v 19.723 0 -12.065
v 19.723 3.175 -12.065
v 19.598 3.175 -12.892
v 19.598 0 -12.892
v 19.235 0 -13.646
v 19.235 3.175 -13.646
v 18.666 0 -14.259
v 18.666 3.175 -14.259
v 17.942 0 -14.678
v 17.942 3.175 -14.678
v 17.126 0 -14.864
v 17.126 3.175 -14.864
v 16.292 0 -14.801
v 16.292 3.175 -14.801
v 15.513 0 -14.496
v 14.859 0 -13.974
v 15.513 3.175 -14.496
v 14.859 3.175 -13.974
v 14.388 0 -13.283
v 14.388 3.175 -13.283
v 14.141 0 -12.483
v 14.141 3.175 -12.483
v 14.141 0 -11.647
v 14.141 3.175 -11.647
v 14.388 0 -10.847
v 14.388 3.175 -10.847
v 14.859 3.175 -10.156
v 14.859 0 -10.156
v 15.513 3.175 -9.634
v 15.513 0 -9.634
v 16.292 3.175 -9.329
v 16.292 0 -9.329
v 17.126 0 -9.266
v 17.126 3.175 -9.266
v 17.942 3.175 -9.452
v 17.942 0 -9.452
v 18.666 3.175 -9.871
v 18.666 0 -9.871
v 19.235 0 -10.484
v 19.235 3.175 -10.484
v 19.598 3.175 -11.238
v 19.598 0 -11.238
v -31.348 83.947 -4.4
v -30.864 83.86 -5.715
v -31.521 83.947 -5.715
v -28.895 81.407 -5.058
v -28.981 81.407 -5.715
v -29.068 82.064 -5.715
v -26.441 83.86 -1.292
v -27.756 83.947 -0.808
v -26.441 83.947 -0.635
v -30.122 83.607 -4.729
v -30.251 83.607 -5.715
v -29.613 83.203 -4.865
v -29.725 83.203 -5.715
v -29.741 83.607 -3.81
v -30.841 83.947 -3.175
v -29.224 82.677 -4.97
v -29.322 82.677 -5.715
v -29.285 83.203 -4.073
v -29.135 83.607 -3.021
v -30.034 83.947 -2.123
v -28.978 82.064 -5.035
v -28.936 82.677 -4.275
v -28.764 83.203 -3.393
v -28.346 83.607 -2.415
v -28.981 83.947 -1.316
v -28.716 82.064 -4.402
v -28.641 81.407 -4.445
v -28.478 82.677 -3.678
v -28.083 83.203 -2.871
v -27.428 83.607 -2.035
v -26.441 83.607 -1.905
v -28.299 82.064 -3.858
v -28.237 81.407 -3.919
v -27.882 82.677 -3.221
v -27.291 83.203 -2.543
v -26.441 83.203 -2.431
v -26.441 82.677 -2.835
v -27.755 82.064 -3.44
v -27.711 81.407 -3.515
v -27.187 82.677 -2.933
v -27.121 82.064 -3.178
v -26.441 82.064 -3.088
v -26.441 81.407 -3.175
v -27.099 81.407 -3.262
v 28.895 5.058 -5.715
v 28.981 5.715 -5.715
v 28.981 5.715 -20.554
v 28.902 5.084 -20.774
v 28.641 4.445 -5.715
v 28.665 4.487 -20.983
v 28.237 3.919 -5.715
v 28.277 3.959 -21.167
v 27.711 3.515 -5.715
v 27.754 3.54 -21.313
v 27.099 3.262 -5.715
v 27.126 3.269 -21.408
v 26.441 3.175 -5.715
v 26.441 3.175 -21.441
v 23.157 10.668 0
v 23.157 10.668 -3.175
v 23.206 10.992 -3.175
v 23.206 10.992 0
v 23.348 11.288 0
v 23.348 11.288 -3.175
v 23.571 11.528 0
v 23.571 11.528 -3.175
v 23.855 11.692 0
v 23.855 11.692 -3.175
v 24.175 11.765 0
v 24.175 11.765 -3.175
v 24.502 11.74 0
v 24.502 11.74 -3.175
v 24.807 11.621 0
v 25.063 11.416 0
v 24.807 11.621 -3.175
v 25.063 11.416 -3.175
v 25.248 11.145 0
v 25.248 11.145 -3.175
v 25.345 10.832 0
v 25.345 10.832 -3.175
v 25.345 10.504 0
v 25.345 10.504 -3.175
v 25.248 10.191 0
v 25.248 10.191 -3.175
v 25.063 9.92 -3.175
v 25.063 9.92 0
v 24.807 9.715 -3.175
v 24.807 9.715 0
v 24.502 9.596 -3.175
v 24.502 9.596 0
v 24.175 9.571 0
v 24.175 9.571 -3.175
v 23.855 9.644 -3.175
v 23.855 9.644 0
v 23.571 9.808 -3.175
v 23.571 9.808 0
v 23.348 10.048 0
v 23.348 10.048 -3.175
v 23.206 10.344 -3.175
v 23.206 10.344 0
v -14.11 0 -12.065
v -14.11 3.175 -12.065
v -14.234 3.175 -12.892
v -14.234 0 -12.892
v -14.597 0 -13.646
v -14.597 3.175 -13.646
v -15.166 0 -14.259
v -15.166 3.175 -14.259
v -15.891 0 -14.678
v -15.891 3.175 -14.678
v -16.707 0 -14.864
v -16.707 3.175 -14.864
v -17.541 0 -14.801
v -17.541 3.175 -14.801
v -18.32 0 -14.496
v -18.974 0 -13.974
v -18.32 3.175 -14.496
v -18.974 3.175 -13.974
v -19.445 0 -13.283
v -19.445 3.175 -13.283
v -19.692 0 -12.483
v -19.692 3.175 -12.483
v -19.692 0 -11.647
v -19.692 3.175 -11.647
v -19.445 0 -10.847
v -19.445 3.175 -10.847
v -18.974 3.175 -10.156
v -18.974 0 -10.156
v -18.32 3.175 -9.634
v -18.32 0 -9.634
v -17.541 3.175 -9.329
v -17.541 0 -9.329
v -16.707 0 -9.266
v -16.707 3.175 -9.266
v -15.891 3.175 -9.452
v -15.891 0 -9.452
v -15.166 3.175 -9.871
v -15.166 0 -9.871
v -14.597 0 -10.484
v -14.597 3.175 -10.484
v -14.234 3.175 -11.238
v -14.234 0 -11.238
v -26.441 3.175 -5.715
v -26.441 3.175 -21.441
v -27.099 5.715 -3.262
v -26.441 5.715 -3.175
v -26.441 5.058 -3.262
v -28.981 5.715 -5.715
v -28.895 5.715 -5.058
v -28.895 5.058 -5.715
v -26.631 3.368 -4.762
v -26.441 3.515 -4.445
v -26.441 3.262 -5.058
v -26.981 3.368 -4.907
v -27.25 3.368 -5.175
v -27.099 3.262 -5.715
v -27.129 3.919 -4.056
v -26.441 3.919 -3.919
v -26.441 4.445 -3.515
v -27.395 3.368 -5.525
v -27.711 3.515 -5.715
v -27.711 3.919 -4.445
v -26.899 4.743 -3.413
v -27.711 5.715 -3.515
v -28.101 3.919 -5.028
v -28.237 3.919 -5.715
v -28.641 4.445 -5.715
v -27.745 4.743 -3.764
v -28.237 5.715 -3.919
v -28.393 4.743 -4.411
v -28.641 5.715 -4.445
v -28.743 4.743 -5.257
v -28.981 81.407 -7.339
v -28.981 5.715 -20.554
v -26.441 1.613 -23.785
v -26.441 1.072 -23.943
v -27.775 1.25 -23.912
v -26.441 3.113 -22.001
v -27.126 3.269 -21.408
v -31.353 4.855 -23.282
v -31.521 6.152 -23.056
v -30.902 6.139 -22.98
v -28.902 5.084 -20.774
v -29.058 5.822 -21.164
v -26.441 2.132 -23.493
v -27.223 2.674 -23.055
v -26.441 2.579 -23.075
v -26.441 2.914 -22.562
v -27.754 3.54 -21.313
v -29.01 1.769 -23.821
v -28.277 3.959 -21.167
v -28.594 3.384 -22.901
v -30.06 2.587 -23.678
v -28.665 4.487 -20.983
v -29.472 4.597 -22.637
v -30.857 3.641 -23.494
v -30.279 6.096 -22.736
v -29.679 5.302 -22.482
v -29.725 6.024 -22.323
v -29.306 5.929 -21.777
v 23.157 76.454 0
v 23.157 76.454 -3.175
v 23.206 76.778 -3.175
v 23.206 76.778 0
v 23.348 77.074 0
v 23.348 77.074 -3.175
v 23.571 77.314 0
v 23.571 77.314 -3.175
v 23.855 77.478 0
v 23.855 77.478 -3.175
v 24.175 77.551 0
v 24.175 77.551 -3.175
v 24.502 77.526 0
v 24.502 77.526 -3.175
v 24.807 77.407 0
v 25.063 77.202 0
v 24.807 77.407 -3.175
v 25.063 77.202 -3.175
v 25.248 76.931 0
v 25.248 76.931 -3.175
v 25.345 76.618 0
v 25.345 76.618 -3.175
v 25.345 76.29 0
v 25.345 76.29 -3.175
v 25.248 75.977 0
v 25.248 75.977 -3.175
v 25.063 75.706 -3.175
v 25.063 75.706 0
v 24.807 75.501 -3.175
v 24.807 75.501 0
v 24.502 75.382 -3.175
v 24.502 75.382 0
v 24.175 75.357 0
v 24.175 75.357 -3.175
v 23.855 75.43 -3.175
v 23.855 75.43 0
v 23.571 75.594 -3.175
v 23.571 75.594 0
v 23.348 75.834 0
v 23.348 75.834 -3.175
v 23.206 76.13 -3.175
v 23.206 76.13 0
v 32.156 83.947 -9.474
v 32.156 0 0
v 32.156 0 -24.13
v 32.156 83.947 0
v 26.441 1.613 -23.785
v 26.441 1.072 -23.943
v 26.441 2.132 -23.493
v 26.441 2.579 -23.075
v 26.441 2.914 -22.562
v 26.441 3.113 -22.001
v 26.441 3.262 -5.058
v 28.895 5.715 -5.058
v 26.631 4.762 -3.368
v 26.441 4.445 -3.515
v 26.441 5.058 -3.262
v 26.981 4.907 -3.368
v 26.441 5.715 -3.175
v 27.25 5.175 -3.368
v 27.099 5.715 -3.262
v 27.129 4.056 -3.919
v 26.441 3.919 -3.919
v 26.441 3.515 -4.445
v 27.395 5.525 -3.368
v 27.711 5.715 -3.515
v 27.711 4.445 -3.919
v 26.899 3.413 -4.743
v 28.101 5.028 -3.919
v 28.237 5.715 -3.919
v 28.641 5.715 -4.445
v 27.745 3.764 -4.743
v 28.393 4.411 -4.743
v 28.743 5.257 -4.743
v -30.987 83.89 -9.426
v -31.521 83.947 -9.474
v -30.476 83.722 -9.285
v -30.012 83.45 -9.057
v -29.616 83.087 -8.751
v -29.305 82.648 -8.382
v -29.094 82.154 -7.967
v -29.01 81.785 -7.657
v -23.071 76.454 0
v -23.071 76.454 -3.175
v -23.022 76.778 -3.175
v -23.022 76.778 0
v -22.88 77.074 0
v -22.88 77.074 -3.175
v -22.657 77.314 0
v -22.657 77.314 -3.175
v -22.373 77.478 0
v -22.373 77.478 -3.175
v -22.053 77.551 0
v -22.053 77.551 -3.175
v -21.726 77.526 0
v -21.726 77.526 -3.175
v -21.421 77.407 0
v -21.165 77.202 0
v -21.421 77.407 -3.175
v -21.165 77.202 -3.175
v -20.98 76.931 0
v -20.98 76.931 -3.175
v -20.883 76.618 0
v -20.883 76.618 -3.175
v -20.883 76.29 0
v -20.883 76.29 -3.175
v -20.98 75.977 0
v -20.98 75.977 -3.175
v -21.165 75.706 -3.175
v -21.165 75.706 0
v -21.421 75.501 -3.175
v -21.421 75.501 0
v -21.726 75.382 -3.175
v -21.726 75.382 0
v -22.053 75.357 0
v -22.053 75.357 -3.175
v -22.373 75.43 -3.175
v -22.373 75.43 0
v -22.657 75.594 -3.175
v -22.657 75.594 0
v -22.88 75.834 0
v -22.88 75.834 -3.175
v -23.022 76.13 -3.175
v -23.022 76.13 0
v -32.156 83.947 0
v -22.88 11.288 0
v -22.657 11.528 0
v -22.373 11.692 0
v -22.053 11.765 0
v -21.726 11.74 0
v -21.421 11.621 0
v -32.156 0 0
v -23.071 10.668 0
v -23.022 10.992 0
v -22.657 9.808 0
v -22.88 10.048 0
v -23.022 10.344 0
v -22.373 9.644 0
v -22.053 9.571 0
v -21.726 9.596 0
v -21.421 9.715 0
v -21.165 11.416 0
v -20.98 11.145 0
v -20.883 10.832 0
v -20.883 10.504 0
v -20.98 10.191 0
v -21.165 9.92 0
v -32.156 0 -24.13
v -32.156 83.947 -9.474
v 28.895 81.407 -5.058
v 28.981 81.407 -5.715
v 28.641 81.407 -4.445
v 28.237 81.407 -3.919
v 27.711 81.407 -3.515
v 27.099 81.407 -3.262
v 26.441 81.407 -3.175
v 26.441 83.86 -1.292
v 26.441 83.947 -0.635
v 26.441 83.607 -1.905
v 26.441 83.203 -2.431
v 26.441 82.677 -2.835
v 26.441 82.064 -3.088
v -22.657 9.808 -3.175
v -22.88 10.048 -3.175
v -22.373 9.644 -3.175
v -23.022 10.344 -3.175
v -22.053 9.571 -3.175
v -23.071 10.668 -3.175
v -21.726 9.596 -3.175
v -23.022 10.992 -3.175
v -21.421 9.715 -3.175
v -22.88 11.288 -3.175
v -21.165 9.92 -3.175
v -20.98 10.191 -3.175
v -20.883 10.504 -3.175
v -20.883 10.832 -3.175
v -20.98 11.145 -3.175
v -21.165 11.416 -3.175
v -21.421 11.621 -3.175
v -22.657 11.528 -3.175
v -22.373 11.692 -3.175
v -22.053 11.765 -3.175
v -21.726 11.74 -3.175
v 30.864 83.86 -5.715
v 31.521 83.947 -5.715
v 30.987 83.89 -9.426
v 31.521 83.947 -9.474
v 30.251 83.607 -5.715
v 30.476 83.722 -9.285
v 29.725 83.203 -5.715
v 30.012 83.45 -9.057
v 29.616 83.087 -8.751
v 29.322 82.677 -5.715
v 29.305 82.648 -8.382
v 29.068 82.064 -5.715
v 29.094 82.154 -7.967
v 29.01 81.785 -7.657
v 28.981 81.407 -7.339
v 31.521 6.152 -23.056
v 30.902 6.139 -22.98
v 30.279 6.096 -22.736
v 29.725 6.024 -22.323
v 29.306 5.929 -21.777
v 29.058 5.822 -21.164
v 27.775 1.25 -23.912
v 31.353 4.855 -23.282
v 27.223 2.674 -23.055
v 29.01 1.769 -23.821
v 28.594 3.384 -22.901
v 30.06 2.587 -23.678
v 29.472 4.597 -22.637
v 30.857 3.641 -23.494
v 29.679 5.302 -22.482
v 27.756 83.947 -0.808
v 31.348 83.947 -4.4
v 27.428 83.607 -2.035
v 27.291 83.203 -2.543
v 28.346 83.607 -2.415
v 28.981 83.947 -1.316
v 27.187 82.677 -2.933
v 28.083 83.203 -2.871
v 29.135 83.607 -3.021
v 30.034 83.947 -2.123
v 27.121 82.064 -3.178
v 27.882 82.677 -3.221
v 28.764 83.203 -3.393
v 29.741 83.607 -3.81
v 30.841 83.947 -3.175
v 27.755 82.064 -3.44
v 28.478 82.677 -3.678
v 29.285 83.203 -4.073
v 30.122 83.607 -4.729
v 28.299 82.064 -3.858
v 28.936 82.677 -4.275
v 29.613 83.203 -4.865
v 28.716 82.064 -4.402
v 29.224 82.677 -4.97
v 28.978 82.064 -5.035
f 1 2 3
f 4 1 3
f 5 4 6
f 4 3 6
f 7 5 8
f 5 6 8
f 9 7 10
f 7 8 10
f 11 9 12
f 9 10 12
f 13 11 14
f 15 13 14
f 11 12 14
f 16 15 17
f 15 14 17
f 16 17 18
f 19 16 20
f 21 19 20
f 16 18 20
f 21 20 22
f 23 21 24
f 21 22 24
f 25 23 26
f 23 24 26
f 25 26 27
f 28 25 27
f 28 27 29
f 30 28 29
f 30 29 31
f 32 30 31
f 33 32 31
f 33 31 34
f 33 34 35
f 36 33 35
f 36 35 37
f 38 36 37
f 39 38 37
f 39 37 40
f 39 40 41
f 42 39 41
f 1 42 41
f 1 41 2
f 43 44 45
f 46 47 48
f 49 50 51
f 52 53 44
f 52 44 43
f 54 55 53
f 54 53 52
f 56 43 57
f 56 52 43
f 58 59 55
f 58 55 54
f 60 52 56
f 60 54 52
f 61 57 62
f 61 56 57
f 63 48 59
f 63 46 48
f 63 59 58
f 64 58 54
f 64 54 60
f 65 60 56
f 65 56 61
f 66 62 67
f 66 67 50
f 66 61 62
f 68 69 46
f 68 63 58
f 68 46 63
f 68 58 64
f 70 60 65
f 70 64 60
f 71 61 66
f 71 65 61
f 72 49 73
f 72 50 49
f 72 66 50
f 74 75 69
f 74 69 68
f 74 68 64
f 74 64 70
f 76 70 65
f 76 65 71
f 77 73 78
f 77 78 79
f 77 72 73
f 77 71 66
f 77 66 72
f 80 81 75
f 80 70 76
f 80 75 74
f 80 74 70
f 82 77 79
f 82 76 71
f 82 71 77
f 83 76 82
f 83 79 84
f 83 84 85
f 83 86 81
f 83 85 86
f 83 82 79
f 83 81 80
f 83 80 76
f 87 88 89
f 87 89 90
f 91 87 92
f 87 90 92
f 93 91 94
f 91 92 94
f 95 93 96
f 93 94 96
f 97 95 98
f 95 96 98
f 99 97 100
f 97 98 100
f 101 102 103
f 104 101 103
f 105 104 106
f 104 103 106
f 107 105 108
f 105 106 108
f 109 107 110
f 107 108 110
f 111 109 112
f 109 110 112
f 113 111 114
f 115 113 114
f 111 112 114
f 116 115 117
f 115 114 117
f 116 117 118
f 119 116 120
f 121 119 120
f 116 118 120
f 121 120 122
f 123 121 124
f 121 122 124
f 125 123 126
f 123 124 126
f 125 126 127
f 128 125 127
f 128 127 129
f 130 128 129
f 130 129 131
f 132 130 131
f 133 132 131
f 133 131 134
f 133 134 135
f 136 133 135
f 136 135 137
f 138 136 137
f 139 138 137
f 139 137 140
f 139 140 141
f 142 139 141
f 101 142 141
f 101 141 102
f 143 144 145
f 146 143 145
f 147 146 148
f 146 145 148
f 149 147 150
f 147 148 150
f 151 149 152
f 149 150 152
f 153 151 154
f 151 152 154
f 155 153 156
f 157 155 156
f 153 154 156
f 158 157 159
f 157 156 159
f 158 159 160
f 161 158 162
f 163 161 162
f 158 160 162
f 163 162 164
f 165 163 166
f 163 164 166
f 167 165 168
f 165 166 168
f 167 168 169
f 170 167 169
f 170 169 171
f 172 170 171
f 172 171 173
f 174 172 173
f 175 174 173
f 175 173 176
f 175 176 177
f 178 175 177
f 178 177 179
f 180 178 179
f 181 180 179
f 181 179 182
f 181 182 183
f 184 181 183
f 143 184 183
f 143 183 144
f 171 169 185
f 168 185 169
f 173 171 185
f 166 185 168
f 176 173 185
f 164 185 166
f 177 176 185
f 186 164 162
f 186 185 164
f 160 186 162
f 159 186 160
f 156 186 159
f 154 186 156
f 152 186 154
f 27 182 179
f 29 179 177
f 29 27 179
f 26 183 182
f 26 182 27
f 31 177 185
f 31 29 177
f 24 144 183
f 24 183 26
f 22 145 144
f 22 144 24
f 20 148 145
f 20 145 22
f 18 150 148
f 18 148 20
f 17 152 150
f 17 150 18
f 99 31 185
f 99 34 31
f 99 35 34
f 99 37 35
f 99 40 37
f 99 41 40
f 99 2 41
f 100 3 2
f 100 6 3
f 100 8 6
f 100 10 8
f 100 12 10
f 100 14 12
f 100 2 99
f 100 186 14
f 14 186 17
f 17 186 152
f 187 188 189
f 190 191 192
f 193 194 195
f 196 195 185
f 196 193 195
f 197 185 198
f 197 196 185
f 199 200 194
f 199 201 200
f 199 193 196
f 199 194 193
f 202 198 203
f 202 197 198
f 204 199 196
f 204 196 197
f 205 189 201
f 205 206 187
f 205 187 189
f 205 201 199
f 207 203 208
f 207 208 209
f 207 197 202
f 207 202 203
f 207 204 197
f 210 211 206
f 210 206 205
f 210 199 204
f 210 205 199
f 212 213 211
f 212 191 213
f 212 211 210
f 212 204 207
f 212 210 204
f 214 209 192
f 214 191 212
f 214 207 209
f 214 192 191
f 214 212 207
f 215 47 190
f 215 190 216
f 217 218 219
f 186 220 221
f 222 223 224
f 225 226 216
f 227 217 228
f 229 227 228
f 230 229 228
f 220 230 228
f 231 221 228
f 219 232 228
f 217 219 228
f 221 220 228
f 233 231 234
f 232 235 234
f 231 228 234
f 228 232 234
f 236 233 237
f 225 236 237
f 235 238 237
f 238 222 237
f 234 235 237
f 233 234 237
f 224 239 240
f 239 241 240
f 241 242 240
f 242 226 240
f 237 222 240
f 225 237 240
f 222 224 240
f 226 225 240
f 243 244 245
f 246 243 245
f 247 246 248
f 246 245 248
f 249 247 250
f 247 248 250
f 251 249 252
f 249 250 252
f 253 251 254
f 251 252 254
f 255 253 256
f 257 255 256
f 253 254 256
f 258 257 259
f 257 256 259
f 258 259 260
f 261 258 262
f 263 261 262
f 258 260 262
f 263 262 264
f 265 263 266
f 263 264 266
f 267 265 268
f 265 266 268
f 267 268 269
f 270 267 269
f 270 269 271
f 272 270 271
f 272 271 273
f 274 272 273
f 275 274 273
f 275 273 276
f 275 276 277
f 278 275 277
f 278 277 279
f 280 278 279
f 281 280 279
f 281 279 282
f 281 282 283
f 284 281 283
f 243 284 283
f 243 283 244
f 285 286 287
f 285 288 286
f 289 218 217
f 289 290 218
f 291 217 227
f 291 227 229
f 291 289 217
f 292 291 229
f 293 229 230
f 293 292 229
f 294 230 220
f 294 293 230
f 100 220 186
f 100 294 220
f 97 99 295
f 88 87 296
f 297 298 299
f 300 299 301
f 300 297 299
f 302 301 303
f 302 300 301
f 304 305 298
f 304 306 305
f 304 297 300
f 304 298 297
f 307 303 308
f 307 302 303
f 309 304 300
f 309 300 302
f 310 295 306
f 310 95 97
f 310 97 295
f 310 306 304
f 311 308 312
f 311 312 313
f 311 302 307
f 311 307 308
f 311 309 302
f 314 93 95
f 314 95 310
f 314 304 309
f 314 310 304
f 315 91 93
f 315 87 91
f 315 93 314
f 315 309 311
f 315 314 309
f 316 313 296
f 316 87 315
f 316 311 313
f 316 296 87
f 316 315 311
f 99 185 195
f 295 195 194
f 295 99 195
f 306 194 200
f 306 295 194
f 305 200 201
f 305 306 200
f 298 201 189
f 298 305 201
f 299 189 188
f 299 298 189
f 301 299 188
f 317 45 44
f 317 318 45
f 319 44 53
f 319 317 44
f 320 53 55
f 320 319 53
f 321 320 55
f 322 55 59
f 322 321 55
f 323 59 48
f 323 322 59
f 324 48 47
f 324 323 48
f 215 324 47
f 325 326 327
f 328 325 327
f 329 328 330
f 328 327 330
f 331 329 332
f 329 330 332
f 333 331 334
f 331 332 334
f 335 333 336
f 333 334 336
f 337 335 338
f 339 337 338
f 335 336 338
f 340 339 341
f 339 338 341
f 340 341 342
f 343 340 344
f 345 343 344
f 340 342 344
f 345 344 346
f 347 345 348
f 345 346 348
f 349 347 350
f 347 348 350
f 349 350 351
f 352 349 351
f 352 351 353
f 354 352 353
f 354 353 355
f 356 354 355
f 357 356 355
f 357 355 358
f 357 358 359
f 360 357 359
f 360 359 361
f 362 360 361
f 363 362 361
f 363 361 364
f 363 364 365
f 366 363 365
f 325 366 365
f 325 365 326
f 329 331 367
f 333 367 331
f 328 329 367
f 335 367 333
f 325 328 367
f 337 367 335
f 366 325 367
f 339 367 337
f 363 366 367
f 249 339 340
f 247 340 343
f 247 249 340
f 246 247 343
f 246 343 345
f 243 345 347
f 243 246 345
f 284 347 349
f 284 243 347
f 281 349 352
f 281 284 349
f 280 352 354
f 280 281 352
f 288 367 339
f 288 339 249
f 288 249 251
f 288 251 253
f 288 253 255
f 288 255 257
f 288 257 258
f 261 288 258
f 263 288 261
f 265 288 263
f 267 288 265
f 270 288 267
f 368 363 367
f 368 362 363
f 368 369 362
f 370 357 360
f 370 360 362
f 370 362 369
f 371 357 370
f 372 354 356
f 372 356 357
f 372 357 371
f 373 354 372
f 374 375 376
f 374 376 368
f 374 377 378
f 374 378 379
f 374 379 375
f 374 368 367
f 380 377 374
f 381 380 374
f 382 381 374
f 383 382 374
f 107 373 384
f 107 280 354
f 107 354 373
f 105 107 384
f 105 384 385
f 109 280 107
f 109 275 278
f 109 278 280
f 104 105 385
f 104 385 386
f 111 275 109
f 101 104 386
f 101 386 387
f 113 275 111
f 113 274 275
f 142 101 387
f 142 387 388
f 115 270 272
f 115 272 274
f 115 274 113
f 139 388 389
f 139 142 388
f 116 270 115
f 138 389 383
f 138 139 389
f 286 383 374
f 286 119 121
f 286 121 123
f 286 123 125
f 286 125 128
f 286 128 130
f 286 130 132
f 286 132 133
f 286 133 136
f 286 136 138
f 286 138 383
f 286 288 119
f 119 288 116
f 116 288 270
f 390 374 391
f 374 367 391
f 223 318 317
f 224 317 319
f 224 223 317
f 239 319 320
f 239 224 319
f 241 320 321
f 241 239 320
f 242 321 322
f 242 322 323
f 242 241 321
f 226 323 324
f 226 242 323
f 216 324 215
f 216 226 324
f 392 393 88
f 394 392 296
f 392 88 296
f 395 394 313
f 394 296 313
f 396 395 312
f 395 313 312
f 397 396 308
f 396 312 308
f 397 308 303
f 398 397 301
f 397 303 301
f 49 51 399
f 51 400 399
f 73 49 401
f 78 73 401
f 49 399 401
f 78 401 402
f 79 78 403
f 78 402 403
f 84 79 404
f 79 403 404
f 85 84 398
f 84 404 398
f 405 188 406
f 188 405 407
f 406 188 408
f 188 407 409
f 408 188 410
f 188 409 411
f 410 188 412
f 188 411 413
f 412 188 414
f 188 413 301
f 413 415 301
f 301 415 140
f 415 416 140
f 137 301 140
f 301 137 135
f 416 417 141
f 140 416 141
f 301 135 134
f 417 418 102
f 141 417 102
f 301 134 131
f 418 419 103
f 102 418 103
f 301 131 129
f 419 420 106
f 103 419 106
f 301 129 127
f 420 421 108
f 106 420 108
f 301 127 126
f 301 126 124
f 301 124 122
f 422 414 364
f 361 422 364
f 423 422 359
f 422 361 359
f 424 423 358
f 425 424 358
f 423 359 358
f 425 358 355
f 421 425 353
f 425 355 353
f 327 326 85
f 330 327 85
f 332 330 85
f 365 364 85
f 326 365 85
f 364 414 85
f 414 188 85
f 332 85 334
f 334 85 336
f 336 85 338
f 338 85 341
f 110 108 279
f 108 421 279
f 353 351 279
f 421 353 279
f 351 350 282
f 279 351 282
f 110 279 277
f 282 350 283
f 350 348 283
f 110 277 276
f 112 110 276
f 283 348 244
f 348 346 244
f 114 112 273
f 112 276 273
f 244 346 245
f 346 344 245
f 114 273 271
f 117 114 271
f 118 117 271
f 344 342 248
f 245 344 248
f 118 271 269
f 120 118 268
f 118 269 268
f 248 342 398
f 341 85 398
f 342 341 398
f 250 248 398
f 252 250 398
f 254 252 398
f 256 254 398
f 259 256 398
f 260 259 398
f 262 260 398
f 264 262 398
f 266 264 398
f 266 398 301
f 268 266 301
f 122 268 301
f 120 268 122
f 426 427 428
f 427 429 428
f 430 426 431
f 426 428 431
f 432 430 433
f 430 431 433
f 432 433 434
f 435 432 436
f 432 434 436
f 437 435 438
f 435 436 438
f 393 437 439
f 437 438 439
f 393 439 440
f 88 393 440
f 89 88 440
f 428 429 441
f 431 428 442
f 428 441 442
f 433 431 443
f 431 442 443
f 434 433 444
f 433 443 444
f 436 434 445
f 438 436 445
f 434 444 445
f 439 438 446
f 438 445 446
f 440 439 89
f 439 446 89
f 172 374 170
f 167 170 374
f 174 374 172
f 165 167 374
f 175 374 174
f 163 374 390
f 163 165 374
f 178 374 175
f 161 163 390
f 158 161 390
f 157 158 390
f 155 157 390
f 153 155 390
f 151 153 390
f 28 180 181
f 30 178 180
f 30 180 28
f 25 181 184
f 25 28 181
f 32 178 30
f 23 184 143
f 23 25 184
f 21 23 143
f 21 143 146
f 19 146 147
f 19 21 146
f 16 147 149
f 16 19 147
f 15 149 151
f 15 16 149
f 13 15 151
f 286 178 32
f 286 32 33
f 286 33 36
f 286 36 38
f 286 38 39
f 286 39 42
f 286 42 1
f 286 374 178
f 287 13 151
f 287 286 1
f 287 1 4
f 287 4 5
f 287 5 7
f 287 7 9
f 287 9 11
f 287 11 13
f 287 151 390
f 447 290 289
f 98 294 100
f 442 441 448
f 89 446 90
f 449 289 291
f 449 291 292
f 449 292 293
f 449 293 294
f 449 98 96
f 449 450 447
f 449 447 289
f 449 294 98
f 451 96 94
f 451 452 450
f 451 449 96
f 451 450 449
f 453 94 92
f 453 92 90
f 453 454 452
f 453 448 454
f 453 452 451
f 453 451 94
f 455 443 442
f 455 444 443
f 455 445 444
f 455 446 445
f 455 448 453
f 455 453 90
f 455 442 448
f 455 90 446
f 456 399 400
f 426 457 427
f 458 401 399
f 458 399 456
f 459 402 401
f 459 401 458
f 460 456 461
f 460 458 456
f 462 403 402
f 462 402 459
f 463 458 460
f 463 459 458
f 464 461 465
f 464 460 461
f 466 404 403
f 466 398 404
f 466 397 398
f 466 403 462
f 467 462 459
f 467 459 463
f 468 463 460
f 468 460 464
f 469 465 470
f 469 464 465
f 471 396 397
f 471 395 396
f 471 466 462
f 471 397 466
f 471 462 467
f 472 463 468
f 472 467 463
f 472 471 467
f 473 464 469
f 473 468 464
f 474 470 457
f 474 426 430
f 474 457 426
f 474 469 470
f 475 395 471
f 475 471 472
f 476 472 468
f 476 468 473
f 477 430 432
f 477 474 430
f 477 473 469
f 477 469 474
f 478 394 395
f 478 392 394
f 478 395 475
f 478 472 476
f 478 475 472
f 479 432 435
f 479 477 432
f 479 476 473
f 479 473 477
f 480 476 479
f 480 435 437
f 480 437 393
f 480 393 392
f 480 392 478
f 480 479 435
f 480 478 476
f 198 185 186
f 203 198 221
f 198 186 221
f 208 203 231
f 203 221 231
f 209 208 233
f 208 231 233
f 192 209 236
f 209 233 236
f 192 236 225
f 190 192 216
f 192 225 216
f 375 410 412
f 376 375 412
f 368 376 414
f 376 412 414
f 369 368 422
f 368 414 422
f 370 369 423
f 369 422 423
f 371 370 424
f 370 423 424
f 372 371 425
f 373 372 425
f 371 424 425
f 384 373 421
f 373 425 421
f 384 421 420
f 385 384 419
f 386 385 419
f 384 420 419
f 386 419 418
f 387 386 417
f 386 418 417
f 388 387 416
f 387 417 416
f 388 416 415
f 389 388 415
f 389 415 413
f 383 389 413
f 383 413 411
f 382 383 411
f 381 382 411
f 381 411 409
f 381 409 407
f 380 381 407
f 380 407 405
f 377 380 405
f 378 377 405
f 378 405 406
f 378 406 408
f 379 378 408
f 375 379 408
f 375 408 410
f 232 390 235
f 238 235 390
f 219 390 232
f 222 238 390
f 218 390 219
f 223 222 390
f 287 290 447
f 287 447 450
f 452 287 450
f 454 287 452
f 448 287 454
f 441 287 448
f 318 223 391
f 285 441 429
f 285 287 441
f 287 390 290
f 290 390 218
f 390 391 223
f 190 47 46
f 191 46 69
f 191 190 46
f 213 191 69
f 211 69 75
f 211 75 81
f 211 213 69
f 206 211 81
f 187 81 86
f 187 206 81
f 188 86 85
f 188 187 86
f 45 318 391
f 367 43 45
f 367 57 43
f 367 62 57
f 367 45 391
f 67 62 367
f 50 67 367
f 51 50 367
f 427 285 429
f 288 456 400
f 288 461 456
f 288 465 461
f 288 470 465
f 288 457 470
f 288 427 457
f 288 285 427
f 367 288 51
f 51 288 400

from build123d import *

# Parameters (mm, degrees)
BOSS_EXTRUDE1_DEPTH        = 32.1564
SKETCH2_W                  = 57.9628
SKETCH2_H                  = 20.955
CUT_EXTRUDE1_DEPTH         = 80.772
M2_CLEARANCE_HOLE1_D       = 2.2
F_2_0_221_DIAMETER_HOLE1_D = 5.6134
FILLET1_R                  = 2.54


with BuildPart() as part:
    # Sketch1 → Boss-Extrude1 (new body, symmetric)
    with BuildSketch(Plane(origin=(0, 0, 0), x_dir=(0, 0, -1), z_dir=(1, 0, 0))):
        Polygon((0, 0), (24.13, 0), (9.4742, 83.947), (0, 83.947), align=None)
    extrude(amount=BOSS_EXTRUDE1_DEPTH, both=True)

    # Sketch2 → Cut-Extrude1 (cut)
    with BuildSketch(Plane(origin=(0, 83.947, 0), x_dir=(1, 0, 0), z_dir=(0, 1, 0))):
        with Locations((0, 13.6525)):
            Rectangle(SKETCH2_W, SKETCH2_H)
    extrude(amount=-CUT_EXTRUDE1_DEPTH, mode=Mode.SUBTRACT)

    # M2 Clearance Hole1 (through all)
    with Locations(Plane.XY):
        with Locations((-21.971, 76.454), (24.257, 76.454), (24.257, 10.668), (-21.971, 10.668)):
            Hole(M2_CLEARANCE_HOLE1_D / 2)

    # #2 (0.221) Diameter Hole1 (through all)
    with Locations(Plane(origin=(0, 0, 0), x_dir=(-1, 0, 0), z_dir=(0, -1, 0))):
        with Locations((-16.9164, 12.065), (16.9164, 12.065)):
            Hole(F_2_0_221_DIAMETER_HOLE1_D / 2)

    # Fillet1
    fillet1_edges = [part.edges().sort_by_distance(p)[0] for p in [
        (0, 3.175, -23.575695915),
        (28.9814, 43.561, -16.524947958),
        (-28.9814, 43.561, -16.524947958),
        (-28.9814, 43.561, -3.175),
        (-28.9814, 83.947, -6.3246),
        (0, 83.947, -3.175),
        (28.9814, 83.947, -6.3246),
        (28.9814, 3.175, -13.375347958),
        (0, 3.175, -3.175),
        (-28.9814, 3.175, -13.375347958),
        (28.9814, 43.561, -3.175),
    ]]
    fillet(fillet1_edges, radius=FILLET1_R)


solid = part.part
